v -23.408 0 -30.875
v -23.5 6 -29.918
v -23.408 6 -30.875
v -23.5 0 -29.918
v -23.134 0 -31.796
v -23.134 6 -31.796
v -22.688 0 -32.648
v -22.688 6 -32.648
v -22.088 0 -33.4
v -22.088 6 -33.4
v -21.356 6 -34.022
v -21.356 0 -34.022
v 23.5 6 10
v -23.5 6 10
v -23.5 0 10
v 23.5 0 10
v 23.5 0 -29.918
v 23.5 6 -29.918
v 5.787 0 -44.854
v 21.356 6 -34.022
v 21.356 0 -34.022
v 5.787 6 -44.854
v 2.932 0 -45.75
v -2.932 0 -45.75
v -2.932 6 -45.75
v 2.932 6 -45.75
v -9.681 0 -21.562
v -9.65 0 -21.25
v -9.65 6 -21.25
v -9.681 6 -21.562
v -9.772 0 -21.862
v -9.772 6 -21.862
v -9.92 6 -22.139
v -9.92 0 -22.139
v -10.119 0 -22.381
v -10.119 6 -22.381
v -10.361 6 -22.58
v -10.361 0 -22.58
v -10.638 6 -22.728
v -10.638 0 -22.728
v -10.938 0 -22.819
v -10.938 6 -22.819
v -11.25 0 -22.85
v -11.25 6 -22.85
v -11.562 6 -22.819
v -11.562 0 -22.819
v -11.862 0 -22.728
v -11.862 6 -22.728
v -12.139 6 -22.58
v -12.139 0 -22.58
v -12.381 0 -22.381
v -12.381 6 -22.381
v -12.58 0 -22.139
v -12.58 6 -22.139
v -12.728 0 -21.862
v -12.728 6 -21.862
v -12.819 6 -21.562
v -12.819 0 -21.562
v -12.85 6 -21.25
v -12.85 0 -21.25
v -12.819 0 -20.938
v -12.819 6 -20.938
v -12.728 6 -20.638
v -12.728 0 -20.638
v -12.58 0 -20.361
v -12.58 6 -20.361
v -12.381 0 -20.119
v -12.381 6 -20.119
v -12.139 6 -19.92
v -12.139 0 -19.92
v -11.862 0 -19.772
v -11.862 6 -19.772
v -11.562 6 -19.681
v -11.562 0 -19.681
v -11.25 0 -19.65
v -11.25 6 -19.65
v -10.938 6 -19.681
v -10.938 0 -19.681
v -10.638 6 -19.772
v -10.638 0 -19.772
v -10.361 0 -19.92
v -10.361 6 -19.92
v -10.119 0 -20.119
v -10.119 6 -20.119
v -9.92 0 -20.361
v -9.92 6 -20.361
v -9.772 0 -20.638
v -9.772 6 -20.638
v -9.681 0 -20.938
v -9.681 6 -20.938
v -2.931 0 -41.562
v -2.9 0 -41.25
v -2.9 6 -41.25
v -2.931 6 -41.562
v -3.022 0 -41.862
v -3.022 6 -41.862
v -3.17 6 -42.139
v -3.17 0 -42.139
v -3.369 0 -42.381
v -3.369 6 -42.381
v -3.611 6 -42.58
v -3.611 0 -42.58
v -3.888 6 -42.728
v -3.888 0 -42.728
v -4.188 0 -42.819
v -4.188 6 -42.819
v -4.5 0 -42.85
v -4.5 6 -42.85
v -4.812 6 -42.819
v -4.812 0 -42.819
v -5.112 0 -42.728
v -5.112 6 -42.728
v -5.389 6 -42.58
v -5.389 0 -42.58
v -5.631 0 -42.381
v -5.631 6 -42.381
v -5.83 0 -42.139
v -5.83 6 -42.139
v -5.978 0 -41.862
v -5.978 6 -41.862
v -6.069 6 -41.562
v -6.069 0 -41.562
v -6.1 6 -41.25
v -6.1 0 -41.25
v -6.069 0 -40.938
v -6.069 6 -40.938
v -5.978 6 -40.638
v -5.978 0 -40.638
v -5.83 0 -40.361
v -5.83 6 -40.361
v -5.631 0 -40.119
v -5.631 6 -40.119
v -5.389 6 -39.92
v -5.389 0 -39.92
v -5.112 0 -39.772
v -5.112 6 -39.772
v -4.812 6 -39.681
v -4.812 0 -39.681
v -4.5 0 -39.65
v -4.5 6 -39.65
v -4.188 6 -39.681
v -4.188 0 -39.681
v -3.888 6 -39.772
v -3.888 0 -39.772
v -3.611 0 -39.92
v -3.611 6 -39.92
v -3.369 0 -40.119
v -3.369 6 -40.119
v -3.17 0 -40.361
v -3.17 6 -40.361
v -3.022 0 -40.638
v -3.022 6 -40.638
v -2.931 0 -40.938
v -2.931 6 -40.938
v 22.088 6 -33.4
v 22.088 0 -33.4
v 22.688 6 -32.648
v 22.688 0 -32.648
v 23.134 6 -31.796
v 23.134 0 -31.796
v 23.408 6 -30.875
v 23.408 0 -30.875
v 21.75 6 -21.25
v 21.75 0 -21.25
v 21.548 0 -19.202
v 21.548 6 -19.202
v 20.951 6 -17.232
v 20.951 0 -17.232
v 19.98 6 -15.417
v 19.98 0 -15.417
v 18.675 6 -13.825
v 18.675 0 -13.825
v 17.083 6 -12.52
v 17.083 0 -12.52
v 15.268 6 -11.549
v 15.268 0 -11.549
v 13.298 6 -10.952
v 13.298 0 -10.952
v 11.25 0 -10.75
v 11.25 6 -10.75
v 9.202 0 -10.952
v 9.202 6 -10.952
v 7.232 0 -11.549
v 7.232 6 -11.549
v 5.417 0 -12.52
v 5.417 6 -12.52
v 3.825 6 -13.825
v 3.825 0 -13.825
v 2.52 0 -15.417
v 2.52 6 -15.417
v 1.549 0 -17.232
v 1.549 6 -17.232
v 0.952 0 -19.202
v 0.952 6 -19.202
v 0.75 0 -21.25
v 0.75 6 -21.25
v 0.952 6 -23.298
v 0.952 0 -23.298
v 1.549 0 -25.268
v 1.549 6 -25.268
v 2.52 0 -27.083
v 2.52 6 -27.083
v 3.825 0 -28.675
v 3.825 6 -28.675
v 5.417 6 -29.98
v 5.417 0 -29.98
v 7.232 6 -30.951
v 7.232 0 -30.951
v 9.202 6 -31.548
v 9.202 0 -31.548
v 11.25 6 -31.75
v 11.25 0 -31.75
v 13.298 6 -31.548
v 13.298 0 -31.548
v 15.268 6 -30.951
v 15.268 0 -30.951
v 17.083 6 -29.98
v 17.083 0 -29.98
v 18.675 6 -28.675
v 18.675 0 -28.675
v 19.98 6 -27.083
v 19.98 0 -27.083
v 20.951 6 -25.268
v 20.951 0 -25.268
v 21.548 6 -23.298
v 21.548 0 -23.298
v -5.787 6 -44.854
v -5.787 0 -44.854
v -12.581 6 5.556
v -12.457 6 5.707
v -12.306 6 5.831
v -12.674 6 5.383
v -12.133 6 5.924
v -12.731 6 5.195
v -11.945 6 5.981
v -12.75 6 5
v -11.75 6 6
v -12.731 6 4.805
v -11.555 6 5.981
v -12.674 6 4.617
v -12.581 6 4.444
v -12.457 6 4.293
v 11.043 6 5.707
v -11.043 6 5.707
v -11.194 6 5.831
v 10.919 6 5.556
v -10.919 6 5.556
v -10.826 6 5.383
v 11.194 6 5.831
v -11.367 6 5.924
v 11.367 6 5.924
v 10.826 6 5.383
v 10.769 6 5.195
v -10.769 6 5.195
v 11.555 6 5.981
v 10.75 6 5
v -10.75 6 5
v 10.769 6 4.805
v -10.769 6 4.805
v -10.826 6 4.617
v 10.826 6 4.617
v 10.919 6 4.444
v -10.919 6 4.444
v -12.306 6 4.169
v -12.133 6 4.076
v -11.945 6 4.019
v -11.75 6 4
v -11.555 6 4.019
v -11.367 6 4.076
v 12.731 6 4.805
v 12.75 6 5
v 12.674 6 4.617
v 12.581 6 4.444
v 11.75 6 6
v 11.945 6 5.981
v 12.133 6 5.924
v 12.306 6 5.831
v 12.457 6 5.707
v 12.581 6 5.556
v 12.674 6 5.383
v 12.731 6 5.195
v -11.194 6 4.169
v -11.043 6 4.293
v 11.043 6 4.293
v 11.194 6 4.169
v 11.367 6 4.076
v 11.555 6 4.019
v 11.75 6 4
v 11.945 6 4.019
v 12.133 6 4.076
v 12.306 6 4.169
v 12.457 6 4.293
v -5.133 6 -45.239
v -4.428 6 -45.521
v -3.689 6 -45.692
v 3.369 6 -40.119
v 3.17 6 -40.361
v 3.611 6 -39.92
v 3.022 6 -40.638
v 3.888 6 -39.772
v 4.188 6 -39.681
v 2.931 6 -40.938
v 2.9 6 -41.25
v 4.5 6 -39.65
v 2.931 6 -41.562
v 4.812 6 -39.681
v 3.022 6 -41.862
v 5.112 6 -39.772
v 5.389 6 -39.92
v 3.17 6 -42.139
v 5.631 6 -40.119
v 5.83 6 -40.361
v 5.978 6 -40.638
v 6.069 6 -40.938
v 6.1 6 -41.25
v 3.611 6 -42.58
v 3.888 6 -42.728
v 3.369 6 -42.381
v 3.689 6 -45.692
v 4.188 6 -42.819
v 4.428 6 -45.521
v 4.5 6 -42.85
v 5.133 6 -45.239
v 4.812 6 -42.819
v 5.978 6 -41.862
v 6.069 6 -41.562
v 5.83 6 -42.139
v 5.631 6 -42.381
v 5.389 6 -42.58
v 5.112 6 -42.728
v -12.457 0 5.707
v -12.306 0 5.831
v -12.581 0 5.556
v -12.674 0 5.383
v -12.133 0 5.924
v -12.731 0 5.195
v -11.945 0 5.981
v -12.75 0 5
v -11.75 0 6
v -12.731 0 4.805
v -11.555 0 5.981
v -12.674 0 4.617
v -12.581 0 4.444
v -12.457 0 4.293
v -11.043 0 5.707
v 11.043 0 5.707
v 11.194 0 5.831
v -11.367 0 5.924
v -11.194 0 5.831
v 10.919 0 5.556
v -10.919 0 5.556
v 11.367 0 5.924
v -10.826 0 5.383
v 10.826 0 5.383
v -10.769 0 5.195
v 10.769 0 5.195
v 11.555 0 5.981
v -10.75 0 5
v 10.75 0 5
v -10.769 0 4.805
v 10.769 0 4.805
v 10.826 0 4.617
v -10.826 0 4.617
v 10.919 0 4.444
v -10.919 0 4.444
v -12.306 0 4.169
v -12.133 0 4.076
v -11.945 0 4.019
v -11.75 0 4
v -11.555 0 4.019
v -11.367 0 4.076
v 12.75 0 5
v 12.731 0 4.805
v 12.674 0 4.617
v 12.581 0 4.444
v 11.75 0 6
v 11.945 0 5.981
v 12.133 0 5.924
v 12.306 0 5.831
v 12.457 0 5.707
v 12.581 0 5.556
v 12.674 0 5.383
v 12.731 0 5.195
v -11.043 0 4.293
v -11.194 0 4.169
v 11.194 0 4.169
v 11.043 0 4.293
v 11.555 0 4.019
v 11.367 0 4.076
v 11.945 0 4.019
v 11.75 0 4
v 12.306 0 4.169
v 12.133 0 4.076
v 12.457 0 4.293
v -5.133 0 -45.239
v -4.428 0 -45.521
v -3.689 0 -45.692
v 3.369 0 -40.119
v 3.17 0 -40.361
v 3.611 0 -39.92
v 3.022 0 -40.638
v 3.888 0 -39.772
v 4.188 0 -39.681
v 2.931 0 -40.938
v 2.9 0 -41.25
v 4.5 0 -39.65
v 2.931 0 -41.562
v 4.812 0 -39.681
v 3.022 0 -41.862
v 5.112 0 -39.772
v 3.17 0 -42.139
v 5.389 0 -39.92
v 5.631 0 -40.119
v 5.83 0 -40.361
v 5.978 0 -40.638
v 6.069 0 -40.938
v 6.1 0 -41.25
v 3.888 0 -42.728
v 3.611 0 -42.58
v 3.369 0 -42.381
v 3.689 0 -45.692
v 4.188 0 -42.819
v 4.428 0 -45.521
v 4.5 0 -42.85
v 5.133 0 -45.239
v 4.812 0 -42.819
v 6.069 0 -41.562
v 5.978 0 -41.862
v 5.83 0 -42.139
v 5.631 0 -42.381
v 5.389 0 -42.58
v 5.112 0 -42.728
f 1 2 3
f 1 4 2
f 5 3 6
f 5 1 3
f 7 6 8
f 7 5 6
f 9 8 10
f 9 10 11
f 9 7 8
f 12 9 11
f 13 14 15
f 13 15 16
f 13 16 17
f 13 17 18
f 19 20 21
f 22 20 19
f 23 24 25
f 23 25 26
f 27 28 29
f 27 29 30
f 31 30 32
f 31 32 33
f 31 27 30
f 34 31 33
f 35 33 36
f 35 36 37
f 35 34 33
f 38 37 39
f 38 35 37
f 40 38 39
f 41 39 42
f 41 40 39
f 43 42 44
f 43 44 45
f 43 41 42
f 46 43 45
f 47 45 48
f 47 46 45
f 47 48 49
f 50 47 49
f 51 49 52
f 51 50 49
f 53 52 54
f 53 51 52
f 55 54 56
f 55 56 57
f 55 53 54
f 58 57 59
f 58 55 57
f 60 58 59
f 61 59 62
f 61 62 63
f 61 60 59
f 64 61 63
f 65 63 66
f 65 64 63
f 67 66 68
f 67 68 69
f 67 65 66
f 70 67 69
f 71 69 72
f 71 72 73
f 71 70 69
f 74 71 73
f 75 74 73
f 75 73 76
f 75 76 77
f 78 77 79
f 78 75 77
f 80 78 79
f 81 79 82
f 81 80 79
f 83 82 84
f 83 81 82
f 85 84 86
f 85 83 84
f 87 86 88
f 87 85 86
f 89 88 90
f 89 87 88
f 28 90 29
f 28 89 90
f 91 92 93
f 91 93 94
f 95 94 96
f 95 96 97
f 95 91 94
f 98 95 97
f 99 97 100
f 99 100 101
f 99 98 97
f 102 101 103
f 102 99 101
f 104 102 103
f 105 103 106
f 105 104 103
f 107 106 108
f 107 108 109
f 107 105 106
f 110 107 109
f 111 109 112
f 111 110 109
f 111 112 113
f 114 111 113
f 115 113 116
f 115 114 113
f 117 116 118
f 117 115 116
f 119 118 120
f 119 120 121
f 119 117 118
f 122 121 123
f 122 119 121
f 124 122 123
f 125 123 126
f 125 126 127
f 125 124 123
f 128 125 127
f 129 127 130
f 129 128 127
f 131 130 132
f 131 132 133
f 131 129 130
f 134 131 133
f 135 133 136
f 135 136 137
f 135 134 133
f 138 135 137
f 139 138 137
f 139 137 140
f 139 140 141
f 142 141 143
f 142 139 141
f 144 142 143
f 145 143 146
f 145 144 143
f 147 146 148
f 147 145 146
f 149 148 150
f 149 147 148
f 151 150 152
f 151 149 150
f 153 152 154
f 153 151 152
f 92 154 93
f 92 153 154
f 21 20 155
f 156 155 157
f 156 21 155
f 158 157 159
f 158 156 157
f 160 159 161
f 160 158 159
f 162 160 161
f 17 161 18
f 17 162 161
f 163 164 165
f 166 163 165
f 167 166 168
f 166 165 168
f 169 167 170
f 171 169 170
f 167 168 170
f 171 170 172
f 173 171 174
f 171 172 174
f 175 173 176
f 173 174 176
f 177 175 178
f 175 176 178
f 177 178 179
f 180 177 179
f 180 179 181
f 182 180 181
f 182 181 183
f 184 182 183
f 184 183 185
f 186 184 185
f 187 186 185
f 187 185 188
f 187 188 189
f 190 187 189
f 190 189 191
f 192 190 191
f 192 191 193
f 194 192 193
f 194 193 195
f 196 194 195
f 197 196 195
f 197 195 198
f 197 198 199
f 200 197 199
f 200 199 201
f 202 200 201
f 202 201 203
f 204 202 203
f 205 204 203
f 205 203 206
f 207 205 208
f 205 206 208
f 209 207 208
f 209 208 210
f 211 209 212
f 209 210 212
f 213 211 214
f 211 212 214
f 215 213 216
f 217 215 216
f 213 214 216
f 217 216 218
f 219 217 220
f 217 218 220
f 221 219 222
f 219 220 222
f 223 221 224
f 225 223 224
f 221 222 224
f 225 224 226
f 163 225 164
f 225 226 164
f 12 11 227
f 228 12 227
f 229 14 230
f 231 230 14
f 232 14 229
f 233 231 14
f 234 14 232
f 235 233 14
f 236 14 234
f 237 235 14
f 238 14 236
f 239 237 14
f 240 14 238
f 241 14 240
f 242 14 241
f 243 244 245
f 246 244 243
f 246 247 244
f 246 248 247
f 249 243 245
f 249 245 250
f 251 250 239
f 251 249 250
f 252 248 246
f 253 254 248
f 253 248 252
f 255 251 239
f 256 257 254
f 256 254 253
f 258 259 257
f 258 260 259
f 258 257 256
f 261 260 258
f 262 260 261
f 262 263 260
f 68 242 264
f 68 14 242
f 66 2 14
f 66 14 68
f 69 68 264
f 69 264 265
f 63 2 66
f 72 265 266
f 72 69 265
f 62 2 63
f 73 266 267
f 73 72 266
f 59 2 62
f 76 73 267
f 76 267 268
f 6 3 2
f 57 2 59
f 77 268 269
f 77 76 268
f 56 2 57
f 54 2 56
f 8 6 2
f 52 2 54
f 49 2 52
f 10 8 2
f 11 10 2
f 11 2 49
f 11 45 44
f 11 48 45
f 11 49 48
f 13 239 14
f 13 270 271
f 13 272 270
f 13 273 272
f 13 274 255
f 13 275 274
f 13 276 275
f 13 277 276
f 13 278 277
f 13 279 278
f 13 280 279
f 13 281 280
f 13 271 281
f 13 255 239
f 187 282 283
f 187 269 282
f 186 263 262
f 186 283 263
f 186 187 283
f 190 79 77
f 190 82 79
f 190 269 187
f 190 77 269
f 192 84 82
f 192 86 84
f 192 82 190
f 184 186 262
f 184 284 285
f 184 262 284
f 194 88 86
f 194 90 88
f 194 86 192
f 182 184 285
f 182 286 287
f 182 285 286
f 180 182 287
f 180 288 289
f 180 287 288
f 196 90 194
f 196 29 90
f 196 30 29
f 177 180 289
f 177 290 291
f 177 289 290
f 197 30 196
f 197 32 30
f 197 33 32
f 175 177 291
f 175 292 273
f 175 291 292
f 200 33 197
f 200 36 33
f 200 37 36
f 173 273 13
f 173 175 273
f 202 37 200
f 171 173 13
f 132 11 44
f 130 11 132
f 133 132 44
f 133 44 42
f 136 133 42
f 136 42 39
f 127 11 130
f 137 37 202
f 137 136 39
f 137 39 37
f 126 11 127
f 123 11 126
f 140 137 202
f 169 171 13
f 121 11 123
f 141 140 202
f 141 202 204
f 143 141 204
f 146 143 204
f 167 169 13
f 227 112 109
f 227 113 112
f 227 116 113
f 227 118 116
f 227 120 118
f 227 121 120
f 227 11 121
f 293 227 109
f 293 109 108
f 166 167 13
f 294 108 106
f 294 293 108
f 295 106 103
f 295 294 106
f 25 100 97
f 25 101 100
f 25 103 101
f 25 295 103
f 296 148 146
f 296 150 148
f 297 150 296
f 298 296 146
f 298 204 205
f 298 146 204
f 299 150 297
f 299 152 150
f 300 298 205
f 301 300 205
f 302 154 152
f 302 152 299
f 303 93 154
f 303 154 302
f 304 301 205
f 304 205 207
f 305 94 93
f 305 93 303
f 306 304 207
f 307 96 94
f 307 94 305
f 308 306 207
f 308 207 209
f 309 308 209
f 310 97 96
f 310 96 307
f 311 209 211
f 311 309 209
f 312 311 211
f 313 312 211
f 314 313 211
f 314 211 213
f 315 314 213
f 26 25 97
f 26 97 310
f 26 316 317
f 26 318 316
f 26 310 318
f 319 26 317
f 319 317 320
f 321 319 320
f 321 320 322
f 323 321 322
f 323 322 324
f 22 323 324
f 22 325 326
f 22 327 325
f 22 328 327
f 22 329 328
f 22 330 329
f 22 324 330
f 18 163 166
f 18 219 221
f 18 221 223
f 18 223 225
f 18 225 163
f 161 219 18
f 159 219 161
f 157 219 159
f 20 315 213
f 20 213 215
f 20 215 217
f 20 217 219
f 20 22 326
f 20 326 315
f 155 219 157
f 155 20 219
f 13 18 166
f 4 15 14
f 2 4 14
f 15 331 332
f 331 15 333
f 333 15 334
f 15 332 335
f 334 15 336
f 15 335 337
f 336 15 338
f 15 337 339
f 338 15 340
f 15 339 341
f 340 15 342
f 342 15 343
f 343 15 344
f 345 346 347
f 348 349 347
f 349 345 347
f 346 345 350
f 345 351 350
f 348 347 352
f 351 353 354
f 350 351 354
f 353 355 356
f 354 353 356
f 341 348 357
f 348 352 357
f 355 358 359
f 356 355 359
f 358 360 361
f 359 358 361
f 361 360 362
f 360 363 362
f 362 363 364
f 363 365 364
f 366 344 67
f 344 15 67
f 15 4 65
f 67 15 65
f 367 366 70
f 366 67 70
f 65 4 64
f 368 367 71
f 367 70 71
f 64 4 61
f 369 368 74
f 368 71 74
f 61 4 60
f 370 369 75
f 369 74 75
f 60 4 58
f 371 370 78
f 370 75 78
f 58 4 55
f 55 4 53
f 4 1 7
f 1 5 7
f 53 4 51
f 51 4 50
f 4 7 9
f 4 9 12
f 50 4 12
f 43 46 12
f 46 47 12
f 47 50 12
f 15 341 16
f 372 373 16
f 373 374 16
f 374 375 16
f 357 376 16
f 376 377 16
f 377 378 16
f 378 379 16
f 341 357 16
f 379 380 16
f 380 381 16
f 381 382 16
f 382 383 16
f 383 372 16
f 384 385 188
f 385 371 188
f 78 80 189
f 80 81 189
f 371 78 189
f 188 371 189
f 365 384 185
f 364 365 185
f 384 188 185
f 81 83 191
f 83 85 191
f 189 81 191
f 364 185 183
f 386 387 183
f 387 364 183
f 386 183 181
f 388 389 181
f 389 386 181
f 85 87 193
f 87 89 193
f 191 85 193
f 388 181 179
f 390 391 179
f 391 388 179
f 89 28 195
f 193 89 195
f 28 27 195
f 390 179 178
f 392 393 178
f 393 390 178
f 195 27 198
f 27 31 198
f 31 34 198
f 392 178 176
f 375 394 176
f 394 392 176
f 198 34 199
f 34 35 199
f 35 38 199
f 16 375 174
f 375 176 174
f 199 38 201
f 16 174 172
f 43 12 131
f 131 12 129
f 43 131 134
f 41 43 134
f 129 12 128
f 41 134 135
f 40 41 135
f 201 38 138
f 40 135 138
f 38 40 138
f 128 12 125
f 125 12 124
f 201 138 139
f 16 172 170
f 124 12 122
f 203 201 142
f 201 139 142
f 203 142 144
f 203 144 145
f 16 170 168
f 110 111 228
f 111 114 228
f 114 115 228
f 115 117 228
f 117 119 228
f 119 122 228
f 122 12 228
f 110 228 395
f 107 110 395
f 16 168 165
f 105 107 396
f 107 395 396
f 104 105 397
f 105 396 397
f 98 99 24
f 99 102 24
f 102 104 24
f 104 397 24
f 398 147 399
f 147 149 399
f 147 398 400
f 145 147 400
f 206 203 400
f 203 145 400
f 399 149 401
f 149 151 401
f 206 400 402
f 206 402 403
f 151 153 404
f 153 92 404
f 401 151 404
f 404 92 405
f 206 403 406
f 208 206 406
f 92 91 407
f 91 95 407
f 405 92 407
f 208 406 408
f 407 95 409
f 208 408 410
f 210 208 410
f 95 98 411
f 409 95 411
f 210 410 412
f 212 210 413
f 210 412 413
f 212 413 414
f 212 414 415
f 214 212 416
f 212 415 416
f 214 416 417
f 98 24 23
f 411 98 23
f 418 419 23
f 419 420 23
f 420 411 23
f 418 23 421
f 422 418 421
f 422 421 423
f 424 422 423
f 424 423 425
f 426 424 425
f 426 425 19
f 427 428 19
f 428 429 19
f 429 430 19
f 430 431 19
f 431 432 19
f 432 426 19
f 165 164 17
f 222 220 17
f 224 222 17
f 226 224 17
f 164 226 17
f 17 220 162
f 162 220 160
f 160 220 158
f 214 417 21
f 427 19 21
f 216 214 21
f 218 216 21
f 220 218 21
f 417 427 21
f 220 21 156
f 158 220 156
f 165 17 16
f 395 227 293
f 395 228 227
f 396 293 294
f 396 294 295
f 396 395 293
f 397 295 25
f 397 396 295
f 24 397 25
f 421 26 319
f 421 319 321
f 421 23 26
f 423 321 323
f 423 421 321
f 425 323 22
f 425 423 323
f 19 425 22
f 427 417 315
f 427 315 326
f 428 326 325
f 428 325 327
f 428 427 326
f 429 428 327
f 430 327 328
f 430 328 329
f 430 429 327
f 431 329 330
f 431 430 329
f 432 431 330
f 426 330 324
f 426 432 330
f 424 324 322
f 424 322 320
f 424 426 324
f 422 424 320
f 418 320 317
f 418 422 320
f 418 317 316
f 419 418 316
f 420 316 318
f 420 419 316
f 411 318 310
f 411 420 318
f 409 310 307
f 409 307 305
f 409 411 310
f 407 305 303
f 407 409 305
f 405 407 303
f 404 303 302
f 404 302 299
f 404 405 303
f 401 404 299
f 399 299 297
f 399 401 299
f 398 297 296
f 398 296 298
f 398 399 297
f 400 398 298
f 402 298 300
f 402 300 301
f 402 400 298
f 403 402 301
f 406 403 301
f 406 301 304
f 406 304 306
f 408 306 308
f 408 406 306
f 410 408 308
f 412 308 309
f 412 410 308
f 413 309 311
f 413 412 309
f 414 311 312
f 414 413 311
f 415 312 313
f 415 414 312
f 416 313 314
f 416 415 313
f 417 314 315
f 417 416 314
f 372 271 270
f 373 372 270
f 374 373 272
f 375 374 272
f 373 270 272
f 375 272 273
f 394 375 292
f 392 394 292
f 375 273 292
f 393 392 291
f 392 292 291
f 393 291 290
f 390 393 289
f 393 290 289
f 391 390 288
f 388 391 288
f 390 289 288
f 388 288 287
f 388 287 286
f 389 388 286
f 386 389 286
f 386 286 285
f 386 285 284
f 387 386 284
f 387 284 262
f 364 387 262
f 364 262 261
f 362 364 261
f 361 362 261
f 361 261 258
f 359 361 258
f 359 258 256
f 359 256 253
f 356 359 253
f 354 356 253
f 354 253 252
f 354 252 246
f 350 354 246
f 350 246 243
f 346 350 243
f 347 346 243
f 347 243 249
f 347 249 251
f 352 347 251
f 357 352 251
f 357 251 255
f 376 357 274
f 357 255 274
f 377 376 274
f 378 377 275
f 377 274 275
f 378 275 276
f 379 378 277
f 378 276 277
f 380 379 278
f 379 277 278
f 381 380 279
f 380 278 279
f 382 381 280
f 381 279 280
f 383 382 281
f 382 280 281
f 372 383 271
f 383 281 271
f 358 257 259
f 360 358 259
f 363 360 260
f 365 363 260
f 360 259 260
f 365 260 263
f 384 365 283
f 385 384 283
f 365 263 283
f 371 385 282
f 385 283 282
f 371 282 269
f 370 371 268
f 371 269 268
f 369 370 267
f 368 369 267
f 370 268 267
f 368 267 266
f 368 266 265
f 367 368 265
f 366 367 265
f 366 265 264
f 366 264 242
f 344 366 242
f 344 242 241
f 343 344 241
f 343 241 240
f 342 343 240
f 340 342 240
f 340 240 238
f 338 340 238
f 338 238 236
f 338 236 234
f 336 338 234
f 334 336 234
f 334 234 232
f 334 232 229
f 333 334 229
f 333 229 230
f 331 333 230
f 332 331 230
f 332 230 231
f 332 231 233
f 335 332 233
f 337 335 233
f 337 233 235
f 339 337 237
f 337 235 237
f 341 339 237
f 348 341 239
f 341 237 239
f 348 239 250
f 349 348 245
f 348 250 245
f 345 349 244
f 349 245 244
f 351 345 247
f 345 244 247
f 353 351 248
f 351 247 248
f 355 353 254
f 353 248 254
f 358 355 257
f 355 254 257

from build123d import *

# Parameters (mm, degrees)
SKETCH1_W           = 47
SKETCH1_H           = 45.75
SKETCH1_R           = 1.6
BOSS_EXTRUDE1_DEPTH = 6
CUT_EXTRUDE1_DEPTH  = 7
FILLET1_R           = 5
SKETCH3_R           = 10.5
CUT_EXTRUDE2_DEPTH  = 7
SKETCH4_W           = 47
SKETCH4_H           = 6
BOSS_EXTRUDE2_DEPTH = 10
SKETCH6_R           = 1
CUT_EXTRUDE3_DEPTH  = 7


with BuildPart() as part:
    # Sketch1 → Boss-Extrude1 (new body)
    with BuildSketch(Plane(origin=(0, 0, 0), x_dir=(1, 0, 0), z_dir=(0, 1, 0))):
        with Locations((0, 22.875)):
            Rectangle(SKETCH1_W, SKETCH1_H)
        with Locations((-4.5, 41.25)):
            Circle(SKETCH1_R, mode=Mode.SUBTRACT)
        with Locations((-11.25, 21.25)):
            Circle(SKETCH1_R, mode=Mode.SUBTRACT)
        with Locations((11.25, 21.25)):
            Circle(SKETCH1_R, mode=Mode.SUBTRACT)
        with Locations((4.5, 41.25)):
            Circle(SKETCH1_R, mode=Mode.SUBTRACT)
    extrude(amount=BOSS_EXTRUDE1_DEPTH)

    # Sketch2 → Cut-Extrude1 (cut, through all)
    with BuildSketch(Plane(origin=(0, 6, 0), x_dir=(1, 0, 0), z_dir=(0, 1, 0))):
        Polygon((23.5, 32.53), (4.5, 45.75), (23.5, 45.75), align=None)
        Polygon((-23.5, 32.53), (-4.5, 45.75), (-23.5, 45.75), align=None)
    extrude(amount=-CUT_EXTRUDE1_DEPTH, mode=Mode.SUBTRACT)

    # Fillet1
    fillet1_edges = [part.edges().sort_by_distance(p)[0] for p in [
        (23.5, 3, -32.53),
        (4.5, 3, -45.75),
        (-23.5, 3, -32.53),
        (-4.5, 3, -45.75),
    ]]
    fillet(fillet1_edges, radius=FILLET1_R)

    # Sketch3 → Cut-Extrude2 (cut, through all)
    with BuildSketch(Plane.XZ):
        with Locations((11.25, -21.25)):
            Circle(SKETCH3_R)
    extrude(amount=-CUT_EXTRUDE2_DEPTH, mode=Mode.SUBTRACT)

    # Sketch4 → Boss-Extrude2 (add)
    with BuildSketch(Plane.XY):
        with Locations((0, 3)):
            Rectangle(SKETCH4_W, SKETCH4_H)
    extrude(amount=BOSS_EXTRUDE2_DEPTH)

    # Sketch6 → Cut-Extrude3 (cut, through all)
    with BuildSketch(Plane(origin=(0, 6, 0), x_dir=(1, 0, 0), z_dir=(0, 1, 0))):
        with Locations((-11.75, -5)):
            Circle(SKETCH6_R)
        with Locations((11.75, -5)):
            Circle(SKETCH6_R)
    extrude(amount=-CUT_EXTRUDE3_DEPTH, mode=Mode.SUBTRACT)


solid = part.part
